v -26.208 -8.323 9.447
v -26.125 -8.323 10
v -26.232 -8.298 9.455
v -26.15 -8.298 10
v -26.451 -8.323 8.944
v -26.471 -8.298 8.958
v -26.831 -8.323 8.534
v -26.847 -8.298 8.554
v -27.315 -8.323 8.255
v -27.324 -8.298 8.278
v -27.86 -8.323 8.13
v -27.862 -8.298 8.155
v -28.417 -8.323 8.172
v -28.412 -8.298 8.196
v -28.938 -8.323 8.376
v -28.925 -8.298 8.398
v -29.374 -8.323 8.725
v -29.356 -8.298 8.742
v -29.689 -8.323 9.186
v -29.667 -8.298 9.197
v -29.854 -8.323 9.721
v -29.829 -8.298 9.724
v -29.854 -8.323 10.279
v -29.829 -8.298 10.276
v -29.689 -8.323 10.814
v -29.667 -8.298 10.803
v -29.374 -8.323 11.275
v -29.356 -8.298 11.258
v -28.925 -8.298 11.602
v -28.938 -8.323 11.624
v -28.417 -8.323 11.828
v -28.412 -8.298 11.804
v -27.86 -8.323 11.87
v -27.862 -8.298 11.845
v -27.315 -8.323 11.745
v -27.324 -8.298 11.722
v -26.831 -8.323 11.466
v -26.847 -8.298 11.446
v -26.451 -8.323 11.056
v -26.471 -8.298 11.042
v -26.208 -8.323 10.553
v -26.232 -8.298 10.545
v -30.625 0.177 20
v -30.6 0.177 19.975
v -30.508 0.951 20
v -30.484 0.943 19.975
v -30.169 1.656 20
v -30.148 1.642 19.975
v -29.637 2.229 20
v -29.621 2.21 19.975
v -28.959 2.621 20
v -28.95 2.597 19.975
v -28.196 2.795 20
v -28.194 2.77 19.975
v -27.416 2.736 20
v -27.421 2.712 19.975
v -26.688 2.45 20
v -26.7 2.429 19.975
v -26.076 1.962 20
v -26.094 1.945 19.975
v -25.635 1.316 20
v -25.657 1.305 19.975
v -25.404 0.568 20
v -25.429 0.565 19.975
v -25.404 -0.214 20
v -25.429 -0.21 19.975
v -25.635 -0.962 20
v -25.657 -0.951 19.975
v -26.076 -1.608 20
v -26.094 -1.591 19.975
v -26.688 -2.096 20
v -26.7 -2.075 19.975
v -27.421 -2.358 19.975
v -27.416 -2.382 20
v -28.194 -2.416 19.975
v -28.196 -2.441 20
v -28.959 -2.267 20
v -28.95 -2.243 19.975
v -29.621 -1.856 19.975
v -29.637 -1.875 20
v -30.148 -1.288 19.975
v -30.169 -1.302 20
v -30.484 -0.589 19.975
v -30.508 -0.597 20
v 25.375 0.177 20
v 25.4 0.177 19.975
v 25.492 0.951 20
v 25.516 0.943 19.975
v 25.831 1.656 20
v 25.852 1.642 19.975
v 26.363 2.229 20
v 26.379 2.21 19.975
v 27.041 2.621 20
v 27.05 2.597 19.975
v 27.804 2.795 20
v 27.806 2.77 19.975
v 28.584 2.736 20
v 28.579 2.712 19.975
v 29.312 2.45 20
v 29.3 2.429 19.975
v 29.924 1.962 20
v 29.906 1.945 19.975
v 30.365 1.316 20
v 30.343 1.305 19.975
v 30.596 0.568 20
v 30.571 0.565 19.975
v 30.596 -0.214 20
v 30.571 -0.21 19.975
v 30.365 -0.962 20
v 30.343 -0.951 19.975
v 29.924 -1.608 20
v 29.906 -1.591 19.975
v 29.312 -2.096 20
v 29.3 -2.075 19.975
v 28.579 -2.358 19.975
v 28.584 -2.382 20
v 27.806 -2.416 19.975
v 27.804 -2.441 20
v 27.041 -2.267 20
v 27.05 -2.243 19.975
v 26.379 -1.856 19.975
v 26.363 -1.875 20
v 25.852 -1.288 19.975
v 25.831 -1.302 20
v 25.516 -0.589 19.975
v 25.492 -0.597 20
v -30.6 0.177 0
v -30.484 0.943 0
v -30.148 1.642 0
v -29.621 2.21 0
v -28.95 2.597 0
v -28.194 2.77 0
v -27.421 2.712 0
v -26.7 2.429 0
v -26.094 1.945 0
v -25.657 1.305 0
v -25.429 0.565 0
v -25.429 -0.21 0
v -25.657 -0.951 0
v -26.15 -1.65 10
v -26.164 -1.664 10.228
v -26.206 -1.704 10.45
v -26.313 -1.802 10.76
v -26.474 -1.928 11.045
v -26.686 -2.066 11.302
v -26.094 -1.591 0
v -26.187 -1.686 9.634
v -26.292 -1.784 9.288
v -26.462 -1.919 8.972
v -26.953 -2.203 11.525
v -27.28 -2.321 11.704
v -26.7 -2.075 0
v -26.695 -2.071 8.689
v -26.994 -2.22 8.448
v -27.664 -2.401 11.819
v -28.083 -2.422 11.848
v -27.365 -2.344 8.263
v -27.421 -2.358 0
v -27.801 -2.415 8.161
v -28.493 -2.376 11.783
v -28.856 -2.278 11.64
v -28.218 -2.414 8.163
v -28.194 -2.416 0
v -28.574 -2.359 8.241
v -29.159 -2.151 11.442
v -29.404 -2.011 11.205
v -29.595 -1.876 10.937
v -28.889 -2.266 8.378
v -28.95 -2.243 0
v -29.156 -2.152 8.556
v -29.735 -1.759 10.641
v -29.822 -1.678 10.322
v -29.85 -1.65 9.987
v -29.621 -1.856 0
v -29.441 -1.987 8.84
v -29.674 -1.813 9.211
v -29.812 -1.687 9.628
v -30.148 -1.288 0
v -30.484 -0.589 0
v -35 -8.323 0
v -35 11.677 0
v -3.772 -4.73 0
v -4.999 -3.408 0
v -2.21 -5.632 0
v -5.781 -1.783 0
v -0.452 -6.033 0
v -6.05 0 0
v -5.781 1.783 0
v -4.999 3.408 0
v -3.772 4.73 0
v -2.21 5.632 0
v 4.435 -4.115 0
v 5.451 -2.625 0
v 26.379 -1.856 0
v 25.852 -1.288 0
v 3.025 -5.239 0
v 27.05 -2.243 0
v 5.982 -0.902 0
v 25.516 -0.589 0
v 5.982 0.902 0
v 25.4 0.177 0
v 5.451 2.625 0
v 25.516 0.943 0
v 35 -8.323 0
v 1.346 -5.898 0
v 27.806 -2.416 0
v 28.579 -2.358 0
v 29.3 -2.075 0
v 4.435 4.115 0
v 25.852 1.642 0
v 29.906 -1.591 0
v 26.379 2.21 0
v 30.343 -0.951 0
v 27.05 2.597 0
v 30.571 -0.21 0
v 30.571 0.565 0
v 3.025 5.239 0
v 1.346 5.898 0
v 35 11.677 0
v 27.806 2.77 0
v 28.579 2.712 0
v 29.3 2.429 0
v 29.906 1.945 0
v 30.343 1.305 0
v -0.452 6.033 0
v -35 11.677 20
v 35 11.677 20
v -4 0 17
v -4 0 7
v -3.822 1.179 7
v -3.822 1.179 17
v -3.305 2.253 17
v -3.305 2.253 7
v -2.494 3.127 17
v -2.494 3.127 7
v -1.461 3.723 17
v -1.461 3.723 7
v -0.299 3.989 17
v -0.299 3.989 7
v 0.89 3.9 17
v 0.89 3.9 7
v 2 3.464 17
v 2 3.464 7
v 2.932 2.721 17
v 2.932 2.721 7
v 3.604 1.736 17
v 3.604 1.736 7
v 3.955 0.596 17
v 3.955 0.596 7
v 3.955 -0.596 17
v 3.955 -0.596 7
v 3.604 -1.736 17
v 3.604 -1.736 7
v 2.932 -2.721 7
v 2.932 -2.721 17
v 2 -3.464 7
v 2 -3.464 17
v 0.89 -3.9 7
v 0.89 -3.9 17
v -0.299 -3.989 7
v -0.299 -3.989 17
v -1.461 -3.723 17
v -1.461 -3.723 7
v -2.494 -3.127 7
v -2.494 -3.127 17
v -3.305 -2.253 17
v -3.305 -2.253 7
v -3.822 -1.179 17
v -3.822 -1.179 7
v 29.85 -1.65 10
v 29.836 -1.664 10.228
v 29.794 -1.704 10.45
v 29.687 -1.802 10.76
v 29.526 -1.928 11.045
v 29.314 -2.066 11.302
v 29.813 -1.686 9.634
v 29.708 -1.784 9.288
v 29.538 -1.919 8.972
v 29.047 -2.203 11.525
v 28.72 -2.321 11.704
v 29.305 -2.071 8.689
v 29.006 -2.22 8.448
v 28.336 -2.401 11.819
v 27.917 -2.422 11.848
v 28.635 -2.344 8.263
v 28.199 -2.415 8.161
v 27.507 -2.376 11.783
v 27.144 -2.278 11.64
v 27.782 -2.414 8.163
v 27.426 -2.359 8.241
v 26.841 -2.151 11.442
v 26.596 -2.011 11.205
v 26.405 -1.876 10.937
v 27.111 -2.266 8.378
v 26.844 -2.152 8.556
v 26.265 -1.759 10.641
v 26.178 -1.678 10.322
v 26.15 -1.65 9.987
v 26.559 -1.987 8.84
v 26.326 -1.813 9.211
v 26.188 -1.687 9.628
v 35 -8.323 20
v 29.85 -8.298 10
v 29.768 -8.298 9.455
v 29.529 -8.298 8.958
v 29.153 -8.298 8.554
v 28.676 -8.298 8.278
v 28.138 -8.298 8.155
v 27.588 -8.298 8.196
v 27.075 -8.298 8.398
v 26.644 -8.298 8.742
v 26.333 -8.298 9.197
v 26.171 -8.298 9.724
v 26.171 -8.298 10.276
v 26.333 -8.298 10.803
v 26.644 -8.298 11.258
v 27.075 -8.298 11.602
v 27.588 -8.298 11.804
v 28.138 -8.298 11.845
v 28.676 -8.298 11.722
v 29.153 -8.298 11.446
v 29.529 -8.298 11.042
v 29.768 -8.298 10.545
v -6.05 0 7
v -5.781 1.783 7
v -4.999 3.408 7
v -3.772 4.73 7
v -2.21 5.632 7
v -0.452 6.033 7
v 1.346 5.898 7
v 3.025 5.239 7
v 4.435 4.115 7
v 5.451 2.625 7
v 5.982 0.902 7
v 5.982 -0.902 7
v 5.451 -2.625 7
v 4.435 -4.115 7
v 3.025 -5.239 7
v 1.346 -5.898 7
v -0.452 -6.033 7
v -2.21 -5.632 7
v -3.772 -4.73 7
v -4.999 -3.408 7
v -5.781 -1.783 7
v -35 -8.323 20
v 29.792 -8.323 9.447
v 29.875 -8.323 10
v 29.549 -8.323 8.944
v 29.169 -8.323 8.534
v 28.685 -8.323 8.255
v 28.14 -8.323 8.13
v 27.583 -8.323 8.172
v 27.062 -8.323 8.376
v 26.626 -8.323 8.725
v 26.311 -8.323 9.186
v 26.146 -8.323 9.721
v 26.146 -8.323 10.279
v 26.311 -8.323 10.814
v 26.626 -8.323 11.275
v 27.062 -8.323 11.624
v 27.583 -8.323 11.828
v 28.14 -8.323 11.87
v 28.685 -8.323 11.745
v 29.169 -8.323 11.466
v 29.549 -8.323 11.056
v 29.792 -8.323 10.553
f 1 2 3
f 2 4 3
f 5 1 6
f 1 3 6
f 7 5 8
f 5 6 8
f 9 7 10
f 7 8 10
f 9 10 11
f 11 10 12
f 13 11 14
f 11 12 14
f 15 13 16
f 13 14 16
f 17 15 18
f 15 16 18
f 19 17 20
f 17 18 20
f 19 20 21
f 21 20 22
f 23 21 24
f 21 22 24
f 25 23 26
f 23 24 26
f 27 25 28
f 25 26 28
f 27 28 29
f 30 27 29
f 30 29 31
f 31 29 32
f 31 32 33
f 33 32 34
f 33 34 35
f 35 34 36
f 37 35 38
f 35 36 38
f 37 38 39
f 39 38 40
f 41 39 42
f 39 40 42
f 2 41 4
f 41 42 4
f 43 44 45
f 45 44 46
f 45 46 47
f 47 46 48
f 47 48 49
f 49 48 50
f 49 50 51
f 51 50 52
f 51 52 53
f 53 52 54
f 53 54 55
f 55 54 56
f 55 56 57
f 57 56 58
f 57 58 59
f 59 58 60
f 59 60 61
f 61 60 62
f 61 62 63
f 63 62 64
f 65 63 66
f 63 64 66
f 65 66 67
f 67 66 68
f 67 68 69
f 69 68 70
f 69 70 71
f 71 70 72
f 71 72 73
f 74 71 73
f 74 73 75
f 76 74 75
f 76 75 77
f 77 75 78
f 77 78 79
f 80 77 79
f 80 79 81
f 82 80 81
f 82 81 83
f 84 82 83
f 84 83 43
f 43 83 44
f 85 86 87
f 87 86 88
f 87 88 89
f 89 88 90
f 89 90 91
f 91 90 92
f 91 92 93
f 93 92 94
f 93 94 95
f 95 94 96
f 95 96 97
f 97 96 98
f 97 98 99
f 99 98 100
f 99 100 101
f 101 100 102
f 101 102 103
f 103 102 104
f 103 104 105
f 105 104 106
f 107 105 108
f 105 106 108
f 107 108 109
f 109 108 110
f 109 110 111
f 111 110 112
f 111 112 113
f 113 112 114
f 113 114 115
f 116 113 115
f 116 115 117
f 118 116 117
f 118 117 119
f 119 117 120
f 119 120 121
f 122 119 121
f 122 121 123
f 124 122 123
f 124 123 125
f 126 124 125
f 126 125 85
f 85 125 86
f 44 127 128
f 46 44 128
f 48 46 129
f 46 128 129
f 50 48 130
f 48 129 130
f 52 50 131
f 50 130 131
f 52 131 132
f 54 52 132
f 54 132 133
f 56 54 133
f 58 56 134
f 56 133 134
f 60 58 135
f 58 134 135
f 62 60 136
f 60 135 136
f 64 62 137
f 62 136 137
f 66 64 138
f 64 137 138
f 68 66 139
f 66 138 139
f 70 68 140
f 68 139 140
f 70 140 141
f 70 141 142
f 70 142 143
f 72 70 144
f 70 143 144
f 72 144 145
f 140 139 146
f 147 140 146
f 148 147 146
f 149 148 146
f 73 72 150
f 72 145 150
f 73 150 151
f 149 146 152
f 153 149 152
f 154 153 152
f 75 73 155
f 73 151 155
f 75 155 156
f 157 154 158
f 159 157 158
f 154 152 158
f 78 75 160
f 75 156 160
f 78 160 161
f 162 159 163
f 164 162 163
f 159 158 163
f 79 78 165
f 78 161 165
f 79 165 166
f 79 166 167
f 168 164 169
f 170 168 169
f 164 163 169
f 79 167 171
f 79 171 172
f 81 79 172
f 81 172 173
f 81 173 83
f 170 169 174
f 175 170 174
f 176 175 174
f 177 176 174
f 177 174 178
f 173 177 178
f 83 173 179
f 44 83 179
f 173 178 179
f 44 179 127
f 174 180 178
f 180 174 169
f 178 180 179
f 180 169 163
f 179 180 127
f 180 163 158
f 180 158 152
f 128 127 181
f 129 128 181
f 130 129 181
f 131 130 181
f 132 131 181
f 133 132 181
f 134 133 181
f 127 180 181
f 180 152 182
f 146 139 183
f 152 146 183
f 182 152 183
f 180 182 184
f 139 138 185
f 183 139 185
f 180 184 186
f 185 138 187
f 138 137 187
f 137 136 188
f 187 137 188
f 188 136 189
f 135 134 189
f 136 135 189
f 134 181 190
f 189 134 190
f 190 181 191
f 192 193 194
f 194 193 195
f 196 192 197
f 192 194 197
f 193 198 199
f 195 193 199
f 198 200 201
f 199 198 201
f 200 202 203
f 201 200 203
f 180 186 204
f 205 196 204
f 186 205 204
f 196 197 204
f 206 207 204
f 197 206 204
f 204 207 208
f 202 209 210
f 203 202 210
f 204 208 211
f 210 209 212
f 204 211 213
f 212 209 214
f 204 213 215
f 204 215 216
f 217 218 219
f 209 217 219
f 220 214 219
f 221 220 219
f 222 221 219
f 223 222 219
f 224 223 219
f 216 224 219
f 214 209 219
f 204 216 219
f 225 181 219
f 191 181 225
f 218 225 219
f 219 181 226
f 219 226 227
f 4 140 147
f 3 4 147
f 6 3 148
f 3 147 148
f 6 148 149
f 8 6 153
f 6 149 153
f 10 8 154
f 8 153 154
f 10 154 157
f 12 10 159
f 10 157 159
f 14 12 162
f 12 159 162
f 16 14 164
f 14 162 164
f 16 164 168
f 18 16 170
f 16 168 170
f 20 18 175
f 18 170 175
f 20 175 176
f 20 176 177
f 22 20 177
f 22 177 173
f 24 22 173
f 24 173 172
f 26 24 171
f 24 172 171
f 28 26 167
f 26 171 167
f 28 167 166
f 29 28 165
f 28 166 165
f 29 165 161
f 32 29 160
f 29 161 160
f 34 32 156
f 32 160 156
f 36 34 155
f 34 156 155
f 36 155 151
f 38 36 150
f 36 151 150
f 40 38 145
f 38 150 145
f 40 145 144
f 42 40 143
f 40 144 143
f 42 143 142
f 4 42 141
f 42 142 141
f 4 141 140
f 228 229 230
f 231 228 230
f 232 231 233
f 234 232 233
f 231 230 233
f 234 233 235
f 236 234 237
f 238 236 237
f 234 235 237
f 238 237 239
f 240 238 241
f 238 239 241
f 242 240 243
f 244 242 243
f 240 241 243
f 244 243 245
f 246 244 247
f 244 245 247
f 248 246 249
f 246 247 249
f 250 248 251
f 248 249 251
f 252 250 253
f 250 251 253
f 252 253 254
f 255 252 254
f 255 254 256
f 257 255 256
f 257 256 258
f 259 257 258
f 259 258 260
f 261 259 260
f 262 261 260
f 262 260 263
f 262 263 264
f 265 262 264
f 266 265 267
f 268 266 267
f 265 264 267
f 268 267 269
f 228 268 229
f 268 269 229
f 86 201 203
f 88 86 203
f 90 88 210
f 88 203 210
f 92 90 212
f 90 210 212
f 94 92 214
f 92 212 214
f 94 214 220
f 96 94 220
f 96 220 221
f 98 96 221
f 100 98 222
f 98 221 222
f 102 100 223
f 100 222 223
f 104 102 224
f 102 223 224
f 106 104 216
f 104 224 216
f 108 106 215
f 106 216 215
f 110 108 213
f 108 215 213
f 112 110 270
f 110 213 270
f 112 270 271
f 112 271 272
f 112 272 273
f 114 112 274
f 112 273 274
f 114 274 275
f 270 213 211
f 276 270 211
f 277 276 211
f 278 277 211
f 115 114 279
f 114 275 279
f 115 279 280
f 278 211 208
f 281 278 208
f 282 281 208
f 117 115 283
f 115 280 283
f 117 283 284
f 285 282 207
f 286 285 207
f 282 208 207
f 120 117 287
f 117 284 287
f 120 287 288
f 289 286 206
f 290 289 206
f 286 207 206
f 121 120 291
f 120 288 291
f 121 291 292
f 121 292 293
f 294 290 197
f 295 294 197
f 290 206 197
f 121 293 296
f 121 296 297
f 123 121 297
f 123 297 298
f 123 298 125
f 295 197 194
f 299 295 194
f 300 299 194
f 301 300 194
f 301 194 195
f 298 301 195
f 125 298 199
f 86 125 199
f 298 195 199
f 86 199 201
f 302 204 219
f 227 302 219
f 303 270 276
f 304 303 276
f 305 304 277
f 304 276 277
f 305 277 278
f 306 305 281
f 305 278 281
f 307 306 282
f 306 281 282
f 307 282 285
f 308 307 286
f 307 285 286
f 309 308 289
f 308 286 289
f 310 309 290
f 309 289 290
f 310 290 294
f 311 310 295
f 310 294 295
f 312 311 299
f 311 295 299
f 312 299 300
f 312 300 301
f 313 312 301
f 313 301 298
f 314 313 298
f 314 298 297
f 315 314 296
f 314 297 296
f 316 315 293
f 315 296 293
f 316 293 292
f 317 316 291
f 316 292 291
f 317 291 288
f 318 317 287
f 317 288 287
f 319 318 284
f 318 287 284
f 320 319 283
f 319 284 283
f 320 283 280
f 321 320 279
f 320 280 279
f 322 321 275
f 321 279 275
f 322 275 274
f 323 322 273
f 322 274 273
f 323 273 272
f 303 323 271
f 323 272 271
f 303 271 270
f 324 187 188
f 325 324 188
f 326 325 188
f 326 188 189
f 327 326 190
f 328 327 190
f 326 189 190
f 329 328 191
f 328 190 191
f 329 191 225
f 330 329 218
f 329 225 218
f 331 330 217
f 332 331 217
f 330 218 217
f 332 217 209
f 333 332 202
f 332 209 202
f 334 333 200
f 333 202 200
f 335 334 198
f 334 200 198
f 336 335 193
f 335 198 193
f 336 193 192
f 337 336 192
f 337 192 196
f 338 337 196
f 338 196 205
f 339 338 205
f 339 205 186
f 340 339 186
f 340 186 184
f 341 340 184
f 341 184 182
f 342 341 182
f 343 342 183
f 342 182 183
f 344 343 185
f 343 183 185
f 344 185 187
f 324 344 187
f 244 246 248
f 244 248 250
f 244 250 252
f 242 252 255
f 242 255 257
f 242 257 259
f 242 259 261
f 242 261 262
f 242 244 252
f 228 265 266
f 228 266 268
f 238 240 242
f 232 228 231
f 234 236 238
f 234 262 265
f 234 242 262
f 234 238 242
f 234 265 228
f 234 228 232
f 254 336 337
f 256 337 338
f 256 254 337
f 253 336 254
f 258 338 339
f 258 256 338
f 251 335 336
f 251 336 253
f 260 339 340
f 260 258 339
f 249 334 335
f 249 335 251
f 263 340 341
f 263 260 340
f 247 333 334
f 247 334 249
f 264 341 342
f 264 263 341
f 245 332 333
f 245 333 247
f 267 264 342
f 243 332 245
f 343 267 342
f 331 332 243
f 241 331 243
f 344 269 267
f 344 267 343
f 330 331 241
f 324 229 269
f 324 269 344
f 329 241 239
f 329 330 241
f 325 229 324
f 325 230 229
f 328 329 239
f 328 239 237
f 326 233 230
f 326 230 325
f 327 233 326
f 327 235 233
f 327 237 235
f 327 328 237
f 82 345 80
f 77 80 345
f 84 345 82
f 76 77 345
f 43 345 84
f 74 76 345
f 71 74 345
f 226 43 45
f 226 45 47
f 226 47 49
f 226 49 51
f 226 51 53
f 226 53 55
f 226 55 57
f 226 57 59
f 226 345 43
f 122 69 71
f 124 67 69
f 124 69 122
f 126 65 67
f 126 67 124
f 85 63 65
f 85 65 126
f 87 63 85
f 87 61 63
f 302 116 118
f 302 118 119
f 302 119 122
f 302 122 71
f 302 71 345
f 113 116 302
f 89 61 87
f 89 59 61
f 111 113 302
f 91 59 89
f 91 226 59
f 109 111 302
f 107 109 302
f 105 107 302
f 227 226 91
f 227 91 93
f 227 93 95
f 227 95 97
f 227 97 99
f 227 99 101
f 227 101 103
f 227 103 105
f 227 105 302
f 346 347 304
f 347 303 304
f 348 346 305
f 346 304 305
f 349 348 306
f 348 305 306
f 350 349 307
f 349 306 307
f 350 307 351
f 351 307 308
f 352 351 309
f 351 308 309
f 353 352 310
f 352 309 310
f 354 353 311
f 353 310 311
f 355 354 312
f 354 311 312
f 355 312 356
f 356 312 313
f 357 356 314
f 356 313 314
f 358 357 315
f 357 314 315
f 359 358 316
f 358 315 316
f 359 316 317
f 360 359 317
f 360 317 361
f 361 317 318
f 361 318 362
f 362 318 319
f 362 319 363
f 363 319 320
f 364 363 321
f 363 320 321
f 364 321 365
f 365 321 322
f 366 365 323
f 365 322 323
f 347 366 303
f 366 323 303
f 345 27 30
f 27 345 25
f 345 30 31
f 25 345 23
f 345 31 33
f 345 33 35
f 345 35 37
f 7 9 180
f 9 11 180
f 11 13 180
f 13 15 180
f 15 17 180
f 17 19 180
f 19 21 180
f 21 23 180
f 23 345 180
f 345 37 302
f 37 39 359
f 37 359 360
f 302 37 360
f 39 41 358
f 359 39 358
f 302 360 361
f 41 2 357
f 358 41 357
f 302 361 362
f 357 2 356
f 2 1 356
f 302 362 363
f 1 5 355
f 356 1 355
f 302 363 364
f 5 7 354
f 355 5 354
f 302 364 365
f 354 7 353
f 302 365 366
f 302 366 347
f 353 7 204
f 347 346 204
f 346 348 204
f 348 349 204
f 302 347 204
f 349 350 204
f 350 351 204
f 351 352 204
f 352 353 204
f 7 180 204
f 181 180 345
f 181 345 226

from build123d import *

# Parameters (mm, degrees)
SKIZZE1_W                                  = 70
SKIZZE1_H                                  = 20
AUFSATZ_LINEAR_AUSTRAGEN1_DEPTH            = 20
F_5_2_5_2_DURCHMESSER_BOHRUNG1_D           = 5.2
F_5_2_5_2_DURCHMESSER_BOHRUNG1_CSINK_D     = 5.25
F_5_2_5_2_DURCHMESSER_BOHRUNG1_CSINK_ANGLE = 90
SKIZZE21_R                                 = 6.05
SCHNITT_LINEAR_AUSTRAGEN3_DEPTH            = 7
SKIZZE22_R                                 = 4
SCHNITT_LINEAR_AUSTRAGEN5_DEPTH            = 10


# Read off the part's stored shape, not the designer's step: Durchgangsloch für M3.51
with BuildPart() as part:
    # Skizze1 → Aufsatz-Linear austragen1 (new body)
    with BuildSketch(Plane.XY):
        with Locations((0, 1.677024639)):
            Rectangle(SKIZZE1_W, SKIZZE1_H)
    extrude(amount=AUFSATZ_LINEAR_AUSTRAGEN1_DEPTH)

    # Ø5.2 (5.2) Durchmesser Bohrung1 (through all)
    with Locations(Plane.XY.offset(20)):
        with Locations((-28, 0.177024639), (28, 0.177024639)):
            CounterSinkHole(F_5_2_5_2_DURCHMESSER_BOHRUNG1_D / 2, F_5_2_5_2_DURCHMESSER_BOHRUNG1_CSINK_D / 2, counter_sink_angle=F_5_2_5_2_DURCHMESSER_BOHRUNG1_CSINK_ANGLE)

    # Durchgangsloch für M3.51 outline → Durchgangsloch für M3.51 (revolve, cut)
    with BuildSketch(Plane(origin=(-28, 0, 10), x_dir=(1, 0, 0), z_dir=(0, 0, 1))):
        Polygon((1.85, -8.297975361), (1.85, -1.649435315), (0, -1.649435315), (0, -8.322975361), (1.875, -8.322975361), align=None)
    revolve(axis=Axis((-28, 0, 10), (0, 1, 0)), mode=Mode.SUBTRACT)

    # Durchgangsloch f_r M3.51 2 outline → Durchgangsloch f_r M3.51 2 (revolve, cut)
    with BuildSketch(Plane(origin=(28, 0, 10), x_dir=(1, 0, 0), z_dir=(0, 0, 1))):
        Polygon((1.85, -8.297975361), (1.85, -1.649435315), (0, -1.649435315), (0, -8.322975361), (1.875, -8.322975361), align=None)
    revolve(axis=Axis((28, 0, 10), (0, 1, 0)), mode=Mode.SUBTRACT)

    # Skizze21 → Schnitt-Linear austragen3 (cut)
    with BuildSketch(Plane(origin=(0, 0, 0), x_dir=(-1, 0, 0), z_dir=(0, 0, -1))):
        Circle(SKIZZE21_R)
    extrude(amount=-SCHNITT_LINEAR_AUSTRAGEN3_DEPTH, mode=Mode.SUBTRACT)

    # Skizze22 → Schnitt-Linear austragen5 (cut)
    with BuildSketch(Plane(origin=(0, 0, 7), x_dir=(-1, 0, 0), z_dir=(0, 0, -1))):
        Circle(SKIZZE22_R)
    extrude(amount=-SCHNITT_LINEAR_AUSTRAGEN5_DEPTH, mode=Mode.SUBTRACT)


solid = part.part
